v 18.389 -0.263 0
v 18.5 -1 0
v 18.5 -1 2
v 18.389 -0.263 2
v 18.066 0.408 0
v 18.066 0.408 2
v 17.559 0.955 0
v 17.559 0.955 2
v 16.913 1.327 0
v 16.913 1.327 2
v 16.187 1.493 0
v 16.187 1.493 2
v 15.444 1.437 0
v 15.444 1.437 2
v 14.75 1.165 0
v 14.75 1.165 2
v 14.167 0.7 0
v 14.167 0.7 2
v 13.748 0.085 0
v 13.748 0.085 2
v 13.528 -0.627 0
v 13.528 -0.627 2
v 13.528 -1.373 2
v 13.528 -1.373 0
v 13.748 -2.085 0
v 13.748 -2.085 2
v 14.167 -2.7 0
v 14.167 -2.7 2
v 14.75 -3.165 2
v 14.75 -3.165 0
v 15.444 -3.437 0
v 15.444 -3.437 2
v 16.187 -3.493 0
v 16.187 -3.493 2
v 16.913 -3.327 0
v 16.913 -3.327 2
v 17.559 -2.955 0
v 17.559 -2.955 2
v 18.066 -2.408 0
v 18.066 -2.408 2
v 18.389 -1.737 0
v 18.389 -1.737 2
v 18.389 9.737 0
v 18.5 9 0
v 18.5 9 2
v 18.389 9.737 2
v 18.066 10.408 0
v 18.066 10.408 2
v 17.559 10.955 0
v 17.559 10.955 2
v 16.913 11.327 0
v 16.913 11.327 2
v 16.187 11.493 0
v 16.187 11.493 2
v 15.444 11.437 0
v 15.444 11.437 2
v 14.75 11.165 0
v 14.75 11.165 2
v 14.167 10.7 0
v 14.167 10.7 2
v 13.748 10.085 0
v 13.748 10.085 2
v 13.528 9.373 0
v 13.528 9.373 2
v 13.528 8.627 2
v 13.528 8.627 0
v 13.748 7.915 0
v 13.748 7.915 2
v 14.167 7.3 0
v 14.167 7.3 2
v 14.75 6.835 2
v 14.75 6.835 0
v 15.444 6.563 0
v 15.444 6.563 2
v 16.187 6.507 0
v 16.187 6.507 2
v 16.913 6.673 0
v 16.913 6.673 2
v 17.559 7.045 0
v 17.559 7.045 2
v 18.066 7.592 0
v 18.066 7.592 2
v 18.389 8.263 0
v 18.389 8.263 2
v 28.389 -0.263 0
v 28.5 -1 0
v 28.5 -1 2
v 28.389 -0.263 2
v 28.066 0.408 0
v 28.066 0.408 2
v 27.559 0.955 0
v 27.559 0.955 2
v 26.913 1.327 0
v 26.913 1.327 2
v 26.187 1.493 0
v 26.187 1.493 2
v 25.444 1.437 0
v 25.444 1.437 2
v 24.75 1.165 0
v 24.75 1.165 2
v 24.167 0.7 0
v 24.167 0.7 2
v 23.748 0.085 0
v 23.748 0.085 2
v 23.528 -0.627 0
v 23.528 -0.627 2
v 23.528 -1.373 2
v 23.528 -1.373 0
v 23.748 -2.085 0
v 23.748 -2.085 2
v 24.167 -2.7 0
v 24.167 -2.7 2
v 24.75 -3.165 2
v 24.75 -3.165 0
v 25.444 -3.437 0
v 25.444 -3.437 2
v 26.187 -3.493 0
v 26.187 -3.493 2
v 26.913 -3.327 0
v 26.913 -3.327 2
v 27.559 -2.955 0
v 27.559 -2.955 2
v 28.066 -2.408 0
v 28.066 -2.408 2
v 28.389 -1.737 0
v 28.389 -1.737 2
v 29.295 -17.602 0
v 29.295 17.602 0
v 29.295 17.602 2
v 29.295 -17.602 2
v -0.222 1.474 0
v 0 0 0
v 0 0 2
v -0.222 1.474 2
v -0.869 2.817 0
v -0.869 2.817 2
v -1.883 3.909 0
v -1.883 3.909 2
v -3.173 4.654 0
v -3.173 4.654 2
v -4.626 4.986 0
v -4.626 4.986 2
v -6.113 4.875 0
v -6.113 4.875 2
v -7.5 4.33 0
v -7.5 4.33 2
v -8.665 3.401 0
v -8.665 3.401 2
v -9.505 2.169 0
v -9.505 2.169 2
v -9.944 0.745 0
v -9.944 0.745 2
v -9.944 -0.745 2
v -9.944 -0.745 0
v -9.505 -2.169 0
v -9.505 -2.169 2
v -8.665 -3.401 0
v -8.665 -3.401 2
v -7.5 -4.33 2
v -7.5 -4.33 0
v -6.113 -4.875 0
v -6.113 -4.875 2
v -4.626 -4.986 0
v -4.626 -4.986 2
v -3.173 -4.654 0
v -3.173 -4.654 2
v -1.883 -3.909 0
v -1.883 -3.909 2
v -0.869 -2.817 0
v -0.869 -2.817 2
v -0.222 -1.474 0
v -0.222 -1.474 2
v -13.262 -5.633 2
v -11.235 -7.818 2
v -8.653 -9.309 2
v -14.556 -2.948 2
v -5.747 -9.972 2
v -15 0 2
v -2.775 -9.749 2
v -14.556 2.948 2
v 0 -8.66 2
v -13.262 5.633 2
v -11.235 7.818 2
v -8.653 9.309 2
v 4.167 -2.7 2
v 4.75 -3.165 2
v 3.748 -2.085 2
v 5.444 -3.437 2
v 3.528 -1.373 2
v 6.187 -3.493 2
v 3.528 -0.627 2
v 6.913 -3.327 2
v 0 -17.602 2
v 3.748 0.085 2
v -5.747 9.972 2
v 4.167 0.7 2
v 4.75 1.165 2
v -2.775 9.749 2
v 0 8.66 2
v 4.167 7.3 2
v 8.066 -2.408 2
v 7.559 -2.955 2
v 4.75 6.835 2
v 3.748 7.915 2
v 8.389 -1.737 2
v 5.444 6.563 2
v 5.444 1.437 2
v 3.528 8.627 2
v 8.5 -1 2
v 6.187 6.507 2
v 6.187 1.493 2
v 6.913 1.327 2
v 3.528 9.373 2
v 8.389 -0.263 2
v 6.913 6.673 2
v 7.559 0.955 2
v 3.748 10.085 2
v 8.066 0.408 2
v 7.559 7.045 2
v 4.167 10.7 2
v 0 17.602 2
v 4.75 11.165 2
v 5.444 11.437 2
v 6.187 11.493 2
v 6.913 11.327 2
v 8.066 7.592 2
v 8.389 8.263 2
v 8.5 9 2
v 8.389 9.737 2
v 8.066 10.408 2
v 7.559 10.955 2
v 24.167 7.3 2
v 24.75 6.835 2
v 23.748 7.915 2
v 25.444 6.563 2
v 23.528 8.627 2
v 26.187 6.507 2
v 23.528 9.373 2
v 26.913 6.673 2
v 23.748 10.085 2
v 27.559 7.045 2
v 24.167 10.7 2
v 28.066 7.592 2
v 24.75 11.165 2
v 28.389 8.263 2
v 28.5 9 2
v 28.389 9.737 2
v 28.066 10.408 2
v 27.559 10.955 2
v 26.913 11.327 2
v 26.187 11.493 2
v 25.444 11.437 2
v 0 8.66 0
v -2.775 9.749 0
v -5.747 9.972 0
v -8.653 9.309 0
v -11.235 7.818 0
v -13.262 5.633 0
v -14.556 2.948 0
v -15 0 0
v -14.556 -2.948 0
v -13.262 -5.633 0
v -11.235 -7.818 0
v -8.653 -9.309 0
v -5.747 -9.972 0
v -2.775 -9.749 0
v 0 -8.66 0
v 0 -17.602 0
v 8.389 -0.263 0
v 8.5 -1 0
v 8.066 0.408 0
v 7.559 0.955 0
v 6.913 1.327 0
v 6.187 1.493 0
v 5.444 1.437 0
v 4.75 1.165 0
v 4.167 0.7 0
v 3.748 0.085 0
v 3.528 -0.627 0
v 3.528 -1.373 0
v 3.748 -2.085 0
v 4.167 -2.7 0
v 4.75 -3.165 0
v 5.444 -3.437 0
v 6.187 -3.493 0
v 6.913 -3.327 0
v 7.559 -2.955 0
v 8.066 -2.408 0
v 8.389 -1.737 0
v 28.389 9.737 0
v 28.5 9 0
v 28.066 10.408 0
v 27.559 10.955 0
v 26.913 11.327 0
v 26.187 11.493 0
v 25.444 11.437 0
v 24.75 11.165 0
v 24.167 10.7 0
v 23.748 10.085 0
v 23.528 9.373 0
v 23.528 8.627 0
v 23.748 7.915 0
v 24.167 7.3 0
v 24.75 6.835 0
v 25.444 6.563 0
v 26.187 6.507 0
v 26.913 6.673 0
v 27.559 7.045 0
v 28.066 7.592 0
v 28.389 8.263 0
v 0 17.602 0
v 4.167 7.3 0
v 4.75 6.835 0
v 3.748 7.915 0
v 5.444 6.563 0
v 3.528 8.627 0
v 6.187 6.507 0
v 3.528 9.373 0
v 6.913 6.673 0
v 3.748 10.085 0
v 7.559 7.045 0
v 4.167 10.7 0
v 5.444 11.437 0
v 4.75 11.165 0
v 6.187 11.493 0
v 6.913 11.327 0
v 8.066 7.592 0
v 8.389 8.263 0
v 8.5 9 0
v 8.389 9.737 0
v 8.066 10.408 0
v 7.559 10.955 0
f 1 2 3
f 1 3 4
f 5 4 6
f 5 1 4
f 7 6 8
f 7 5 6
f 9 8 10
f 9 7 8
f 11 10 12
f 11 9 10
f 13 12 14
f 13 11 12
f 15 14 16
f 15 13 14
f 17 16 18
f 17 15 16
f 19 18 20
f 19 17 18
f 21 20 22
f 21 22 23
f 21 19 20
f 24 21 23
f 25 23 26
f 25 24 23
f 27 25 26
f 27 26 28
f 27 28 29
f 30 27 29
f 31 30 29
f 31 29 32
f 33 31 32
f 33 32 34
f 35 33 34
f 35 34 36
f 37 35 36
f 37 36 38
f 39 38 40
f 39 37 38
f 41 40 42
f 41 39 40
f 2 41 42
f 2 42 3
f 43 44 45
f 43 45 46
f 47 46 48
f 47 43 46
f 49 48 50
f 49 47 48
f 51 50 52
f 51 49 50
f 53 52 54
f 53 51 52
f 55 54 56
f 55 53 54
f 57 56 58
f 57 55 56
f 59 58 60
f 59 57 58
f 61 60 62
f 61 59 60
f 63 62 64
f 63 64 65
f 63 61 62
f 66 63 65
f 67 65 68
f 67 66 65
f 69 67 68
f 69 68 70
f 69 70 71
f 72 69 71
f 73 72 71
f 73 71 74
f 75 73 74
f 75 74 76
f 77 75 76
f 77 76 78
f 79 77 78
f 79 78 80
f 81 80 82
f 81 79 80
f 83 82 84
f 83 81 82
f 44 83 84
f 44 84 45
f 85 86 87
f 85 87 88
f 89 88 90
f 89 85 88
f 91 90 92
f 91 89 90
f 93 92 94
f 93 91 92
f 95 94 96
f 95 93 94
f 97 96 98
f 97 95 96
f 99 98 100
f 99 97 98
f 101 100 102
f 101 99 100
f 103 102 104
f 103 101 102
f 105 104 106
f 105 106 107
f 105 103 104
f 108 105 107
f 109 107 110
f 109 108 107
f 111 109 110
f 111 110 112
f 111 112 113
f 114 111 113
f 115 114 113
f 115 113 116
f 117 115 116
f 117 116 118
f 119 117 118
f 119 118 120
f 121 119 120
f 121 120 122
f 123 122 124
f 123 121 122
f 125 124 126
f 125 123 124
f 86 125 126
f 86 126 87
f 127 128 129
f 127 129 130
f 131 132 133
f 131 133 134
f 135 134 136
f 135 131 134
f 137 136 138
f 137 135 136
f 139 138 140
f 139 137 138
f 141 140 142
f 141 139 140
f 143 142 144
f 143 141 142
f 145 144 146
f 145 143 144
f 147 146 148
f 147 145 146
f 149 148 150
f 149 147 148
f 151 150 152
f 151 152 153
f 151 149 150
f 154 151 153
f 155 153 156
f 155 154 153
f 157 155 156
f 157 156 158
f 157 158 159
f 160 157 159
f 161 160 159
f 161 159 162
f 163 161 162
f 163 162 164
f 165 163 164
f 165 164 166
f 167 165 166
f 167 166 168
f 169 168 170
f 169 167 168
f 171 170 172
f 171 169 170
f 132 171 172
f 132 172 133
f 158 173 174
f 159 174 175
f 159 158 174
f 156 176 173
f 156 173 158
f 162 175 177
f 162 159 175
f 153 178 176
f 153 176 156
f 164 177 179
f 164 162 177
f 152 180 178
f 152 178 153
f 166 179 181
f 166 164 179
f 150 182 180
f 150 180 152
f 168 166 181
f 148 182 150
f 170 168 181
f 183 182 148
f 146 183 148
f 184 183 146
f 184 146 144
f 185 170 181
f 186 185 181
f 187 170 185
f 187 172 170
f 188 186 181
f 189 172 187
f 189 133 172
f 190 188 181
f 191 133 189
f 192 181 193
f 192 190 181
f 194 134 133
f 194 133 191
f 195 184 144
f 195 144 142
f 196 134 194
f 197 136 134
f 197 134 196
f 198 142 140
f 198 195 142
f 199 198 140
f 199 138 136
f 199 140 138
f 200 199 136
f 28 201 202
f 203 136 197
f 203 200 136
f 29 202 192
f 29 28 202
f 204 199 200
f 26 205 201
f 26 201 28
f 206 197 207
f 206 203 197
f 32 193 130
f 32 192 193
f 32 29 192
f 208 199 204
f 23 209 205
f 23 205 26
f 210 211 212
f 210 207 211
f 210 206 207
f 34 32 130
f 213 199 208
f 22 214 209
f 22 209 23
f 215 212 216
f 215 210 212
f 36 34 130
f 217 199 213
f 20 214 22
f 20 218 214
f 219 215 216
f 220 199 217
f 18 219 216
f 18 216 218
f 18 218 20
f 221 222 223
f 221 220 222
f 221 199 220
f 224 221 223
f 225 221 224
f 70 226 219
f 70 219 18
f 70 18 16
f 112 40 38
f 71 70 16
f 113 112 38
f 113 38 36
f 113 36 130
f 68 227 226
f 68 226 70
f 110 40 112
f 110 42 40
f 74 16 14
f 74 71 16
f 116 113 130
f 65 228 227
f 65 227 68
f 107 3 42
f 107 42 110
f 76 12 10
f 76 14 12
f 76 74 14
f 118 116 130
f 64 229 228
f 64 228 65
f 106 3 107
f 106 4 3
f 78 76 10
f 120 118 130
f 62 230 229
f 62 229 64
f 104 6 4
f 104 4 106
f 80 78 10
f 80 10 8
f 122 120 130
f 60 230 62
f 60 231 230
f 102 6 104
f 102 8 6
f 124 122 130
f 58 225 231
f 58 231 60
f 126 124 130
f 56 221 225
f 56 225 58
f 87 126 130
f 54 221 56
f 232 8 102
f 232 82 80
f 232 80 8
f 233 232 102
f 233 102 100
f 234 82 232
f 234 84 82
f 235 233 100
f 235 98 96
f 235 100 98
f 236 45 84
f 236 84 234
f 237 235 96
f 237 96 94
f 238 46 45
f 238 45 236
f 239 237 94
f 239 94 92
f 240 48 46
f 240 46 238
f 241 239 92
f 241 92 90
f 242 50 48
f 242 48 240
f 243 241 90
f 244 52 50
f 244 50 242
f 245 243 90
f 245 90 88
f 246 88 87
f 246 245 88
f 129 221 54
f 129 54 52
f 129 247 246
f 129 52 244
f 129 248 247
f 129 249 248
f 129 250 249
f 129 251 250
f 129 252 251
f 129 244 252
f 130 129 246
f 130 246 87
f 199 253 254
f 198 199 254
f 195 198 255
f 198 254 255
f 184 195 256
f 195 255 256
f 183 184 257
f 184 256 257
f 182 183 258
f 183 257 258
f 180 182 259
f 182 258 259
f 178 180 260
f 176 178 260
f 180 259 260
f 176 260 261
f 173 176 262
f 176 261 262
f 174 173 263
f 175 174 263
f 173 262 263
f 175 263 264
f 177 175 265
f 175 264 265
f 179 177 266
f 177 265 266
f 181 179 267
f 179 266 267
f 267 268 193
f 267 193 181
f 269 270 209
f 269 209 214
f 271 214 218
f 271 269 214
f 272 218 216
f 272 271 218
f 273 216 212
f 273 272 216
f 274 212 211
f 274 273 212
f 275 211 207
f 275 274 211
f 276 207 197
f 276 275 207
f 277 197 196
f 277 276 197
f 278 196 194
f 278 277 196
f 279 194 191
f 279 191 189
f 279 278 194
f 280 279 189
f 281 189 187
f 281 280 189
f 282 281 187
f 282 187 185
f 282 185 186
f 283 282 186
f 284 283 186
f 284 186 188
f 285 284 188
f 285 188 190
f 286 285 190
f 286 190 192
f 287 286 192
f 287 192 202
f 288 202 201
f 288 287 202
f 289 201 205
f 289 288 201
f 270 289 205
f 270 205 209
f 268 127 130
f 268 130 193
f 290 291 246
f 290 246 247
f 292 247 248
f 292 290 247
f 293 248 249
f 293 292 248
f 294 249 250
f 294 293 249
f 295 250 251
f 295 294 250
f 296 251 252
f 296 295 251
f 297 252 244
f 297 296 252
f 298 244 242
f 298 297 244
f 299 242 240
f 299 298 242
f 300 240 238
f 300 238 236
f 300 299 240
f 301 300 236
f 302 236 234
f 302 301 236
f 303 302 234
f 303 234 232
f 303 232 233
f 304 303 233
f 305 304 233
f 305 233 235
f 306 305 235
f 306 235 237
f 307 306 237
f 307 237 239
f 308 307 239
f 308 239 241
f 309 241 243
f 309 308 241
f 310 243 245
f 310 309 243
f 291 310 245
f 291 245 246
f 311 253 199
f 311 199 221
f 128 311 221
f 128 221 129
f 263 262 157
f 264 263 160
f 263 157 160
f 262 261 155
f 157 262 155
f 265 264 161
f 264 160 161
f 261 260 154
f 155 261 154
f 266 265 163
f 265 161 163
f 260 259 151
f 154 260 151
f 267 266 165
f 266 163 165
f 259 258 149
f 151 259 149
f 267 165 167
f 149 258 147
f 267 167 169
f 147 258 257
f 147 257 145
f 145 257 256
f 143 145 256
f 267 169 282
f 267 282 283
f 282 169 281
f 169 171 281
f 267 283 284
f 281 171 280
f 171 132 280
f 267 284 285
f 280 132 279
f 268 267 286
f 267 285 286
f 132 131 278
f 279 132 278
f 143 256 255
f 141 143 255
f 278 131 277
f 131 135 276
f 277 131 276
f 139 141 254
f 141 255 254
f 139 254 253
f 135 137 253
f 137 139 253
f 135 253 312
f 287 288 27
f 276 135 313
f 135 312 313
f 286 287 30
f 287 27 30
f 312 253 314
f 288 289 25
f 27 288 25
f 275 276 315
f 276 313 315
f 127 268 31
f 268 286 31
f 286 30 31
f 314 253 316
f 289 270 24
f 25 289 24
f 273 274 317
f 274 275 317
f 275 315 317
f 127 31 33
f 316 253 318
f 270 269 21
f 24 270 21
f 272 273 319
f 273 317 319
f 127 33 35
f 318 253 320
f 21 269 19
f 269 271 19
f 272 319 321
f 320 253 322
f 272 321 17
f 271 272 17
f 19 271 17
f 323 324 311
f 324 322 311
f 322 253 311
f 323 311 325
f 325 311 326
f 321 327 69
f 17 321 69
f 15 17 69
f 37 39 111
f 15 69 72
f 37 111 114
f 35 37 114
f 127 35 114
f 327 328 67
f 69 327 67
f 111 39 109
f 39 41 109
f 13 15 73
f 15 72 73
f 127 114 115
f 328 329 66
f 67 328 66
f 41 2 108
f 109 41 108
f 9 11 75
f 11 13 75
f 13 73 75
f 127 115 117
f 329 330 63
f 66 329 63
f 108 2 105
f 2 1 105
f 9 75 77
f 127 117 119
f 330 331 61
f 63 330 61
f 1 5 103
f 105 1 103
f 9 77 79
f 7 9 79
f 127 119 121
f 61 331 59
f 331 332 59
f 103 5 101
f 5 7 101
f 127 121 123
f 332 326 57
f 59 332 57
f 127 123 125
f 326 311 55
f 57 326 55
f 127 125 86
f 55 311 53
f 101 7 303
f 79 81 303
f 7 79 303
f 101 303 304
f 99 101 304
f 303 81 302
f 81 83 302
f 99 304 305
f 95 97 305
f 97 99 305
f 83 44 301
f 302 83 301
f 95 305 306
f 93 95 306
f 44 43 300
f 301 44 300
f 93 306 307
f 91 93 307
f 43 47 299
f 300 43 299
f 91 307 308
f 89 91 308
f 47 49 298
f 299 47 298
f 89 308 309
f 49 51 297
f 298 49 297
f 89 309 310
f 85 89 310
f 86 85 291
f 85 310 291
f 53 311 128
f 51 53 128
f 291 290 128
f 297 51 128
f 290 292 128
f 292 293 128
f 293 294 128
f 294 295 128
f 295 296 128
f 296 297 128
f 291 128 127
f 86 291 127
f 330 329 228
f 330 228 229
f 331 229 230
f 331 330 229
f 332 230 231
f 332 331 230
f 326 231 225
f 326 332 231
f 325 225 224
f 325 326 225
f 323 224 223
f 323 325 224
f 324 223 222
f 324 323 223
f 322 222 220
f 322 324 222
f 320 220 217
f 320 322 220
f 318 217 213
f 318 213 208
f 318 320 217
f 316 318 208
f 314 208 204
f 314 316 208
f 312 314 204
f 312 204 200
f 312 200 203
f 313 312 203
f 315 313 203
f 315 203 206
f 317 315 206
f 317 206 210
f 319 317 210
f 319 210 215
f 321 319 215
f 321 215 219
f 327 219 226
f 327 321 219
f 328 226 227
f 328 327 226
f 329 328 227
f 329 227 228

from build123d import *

# Parameters (mm, degrees)
SKETCH001_R      = 2.5
EXTRUDE001_DEPTH = 2
ARRAY_X_COUNT    = 3
ARRAY_X_PITCH    = 10
ARRAY_Y_COUNT    = 2
ARRAY_Y_PITCH    = 10
SKETCH_R         = 5
EXTRUDE_DEPTH    = 2


with BuildPart() as array:
    # Sketch001 (on Sketch) → Extrude001 (new body)
    with BuildSketch(Plane.XY):
        with Locations((6, 9)):
            Circle(SKETCH001_R)
    extrude(amount=EXTRUDE001_DEPTH)

    # Array X: Array ×3


with BuildPart() as array_1:
    add(array.part)
    with Locations(*[(i * ARRAY_X_PITCH, 0, 0) for i in range(1, ARRAY_X_COUNT)]):
        add(array.part)

    # Array Y: Array ×2


with BuildPart() as array_2:
    add(array_1.part)
    with Locations(*[(0, -i * ARRAY_Y_PITCH, 0) for i in range(1, ARRAY_Y_COUNT)]):
        add(array_1.part)


with BuildPart() as cut:
    # Sketch → Extrude (new body)
    with BuildSketch(Plane.XY):
        with BuildLine():
            ThreePointArc((0, 8.660254), (-15, 0), (0, -8.660254))
            Line((0, -17.601841), (0, -8.660254))
            Line((29.294832, -17.601841), (0, -17.601841))
            Line((29.294832, 17.601841), (29.294832, -17.601841))
            Line((0, 17.601841), (29.294832, 17.601841))
            Line((0, 8.660254), (0, 17.601841))
        make_face()
        with Locations((-5, 0)):
            Circle(SKETCH_R, mode=Mode.SUBTRACT)
    extrude(amount=EXTRUDE_DEPTH)

    # Cut: cut Array
    add(array_2.part, mode=Mode.SUBTRACT)


solid = cut.part
